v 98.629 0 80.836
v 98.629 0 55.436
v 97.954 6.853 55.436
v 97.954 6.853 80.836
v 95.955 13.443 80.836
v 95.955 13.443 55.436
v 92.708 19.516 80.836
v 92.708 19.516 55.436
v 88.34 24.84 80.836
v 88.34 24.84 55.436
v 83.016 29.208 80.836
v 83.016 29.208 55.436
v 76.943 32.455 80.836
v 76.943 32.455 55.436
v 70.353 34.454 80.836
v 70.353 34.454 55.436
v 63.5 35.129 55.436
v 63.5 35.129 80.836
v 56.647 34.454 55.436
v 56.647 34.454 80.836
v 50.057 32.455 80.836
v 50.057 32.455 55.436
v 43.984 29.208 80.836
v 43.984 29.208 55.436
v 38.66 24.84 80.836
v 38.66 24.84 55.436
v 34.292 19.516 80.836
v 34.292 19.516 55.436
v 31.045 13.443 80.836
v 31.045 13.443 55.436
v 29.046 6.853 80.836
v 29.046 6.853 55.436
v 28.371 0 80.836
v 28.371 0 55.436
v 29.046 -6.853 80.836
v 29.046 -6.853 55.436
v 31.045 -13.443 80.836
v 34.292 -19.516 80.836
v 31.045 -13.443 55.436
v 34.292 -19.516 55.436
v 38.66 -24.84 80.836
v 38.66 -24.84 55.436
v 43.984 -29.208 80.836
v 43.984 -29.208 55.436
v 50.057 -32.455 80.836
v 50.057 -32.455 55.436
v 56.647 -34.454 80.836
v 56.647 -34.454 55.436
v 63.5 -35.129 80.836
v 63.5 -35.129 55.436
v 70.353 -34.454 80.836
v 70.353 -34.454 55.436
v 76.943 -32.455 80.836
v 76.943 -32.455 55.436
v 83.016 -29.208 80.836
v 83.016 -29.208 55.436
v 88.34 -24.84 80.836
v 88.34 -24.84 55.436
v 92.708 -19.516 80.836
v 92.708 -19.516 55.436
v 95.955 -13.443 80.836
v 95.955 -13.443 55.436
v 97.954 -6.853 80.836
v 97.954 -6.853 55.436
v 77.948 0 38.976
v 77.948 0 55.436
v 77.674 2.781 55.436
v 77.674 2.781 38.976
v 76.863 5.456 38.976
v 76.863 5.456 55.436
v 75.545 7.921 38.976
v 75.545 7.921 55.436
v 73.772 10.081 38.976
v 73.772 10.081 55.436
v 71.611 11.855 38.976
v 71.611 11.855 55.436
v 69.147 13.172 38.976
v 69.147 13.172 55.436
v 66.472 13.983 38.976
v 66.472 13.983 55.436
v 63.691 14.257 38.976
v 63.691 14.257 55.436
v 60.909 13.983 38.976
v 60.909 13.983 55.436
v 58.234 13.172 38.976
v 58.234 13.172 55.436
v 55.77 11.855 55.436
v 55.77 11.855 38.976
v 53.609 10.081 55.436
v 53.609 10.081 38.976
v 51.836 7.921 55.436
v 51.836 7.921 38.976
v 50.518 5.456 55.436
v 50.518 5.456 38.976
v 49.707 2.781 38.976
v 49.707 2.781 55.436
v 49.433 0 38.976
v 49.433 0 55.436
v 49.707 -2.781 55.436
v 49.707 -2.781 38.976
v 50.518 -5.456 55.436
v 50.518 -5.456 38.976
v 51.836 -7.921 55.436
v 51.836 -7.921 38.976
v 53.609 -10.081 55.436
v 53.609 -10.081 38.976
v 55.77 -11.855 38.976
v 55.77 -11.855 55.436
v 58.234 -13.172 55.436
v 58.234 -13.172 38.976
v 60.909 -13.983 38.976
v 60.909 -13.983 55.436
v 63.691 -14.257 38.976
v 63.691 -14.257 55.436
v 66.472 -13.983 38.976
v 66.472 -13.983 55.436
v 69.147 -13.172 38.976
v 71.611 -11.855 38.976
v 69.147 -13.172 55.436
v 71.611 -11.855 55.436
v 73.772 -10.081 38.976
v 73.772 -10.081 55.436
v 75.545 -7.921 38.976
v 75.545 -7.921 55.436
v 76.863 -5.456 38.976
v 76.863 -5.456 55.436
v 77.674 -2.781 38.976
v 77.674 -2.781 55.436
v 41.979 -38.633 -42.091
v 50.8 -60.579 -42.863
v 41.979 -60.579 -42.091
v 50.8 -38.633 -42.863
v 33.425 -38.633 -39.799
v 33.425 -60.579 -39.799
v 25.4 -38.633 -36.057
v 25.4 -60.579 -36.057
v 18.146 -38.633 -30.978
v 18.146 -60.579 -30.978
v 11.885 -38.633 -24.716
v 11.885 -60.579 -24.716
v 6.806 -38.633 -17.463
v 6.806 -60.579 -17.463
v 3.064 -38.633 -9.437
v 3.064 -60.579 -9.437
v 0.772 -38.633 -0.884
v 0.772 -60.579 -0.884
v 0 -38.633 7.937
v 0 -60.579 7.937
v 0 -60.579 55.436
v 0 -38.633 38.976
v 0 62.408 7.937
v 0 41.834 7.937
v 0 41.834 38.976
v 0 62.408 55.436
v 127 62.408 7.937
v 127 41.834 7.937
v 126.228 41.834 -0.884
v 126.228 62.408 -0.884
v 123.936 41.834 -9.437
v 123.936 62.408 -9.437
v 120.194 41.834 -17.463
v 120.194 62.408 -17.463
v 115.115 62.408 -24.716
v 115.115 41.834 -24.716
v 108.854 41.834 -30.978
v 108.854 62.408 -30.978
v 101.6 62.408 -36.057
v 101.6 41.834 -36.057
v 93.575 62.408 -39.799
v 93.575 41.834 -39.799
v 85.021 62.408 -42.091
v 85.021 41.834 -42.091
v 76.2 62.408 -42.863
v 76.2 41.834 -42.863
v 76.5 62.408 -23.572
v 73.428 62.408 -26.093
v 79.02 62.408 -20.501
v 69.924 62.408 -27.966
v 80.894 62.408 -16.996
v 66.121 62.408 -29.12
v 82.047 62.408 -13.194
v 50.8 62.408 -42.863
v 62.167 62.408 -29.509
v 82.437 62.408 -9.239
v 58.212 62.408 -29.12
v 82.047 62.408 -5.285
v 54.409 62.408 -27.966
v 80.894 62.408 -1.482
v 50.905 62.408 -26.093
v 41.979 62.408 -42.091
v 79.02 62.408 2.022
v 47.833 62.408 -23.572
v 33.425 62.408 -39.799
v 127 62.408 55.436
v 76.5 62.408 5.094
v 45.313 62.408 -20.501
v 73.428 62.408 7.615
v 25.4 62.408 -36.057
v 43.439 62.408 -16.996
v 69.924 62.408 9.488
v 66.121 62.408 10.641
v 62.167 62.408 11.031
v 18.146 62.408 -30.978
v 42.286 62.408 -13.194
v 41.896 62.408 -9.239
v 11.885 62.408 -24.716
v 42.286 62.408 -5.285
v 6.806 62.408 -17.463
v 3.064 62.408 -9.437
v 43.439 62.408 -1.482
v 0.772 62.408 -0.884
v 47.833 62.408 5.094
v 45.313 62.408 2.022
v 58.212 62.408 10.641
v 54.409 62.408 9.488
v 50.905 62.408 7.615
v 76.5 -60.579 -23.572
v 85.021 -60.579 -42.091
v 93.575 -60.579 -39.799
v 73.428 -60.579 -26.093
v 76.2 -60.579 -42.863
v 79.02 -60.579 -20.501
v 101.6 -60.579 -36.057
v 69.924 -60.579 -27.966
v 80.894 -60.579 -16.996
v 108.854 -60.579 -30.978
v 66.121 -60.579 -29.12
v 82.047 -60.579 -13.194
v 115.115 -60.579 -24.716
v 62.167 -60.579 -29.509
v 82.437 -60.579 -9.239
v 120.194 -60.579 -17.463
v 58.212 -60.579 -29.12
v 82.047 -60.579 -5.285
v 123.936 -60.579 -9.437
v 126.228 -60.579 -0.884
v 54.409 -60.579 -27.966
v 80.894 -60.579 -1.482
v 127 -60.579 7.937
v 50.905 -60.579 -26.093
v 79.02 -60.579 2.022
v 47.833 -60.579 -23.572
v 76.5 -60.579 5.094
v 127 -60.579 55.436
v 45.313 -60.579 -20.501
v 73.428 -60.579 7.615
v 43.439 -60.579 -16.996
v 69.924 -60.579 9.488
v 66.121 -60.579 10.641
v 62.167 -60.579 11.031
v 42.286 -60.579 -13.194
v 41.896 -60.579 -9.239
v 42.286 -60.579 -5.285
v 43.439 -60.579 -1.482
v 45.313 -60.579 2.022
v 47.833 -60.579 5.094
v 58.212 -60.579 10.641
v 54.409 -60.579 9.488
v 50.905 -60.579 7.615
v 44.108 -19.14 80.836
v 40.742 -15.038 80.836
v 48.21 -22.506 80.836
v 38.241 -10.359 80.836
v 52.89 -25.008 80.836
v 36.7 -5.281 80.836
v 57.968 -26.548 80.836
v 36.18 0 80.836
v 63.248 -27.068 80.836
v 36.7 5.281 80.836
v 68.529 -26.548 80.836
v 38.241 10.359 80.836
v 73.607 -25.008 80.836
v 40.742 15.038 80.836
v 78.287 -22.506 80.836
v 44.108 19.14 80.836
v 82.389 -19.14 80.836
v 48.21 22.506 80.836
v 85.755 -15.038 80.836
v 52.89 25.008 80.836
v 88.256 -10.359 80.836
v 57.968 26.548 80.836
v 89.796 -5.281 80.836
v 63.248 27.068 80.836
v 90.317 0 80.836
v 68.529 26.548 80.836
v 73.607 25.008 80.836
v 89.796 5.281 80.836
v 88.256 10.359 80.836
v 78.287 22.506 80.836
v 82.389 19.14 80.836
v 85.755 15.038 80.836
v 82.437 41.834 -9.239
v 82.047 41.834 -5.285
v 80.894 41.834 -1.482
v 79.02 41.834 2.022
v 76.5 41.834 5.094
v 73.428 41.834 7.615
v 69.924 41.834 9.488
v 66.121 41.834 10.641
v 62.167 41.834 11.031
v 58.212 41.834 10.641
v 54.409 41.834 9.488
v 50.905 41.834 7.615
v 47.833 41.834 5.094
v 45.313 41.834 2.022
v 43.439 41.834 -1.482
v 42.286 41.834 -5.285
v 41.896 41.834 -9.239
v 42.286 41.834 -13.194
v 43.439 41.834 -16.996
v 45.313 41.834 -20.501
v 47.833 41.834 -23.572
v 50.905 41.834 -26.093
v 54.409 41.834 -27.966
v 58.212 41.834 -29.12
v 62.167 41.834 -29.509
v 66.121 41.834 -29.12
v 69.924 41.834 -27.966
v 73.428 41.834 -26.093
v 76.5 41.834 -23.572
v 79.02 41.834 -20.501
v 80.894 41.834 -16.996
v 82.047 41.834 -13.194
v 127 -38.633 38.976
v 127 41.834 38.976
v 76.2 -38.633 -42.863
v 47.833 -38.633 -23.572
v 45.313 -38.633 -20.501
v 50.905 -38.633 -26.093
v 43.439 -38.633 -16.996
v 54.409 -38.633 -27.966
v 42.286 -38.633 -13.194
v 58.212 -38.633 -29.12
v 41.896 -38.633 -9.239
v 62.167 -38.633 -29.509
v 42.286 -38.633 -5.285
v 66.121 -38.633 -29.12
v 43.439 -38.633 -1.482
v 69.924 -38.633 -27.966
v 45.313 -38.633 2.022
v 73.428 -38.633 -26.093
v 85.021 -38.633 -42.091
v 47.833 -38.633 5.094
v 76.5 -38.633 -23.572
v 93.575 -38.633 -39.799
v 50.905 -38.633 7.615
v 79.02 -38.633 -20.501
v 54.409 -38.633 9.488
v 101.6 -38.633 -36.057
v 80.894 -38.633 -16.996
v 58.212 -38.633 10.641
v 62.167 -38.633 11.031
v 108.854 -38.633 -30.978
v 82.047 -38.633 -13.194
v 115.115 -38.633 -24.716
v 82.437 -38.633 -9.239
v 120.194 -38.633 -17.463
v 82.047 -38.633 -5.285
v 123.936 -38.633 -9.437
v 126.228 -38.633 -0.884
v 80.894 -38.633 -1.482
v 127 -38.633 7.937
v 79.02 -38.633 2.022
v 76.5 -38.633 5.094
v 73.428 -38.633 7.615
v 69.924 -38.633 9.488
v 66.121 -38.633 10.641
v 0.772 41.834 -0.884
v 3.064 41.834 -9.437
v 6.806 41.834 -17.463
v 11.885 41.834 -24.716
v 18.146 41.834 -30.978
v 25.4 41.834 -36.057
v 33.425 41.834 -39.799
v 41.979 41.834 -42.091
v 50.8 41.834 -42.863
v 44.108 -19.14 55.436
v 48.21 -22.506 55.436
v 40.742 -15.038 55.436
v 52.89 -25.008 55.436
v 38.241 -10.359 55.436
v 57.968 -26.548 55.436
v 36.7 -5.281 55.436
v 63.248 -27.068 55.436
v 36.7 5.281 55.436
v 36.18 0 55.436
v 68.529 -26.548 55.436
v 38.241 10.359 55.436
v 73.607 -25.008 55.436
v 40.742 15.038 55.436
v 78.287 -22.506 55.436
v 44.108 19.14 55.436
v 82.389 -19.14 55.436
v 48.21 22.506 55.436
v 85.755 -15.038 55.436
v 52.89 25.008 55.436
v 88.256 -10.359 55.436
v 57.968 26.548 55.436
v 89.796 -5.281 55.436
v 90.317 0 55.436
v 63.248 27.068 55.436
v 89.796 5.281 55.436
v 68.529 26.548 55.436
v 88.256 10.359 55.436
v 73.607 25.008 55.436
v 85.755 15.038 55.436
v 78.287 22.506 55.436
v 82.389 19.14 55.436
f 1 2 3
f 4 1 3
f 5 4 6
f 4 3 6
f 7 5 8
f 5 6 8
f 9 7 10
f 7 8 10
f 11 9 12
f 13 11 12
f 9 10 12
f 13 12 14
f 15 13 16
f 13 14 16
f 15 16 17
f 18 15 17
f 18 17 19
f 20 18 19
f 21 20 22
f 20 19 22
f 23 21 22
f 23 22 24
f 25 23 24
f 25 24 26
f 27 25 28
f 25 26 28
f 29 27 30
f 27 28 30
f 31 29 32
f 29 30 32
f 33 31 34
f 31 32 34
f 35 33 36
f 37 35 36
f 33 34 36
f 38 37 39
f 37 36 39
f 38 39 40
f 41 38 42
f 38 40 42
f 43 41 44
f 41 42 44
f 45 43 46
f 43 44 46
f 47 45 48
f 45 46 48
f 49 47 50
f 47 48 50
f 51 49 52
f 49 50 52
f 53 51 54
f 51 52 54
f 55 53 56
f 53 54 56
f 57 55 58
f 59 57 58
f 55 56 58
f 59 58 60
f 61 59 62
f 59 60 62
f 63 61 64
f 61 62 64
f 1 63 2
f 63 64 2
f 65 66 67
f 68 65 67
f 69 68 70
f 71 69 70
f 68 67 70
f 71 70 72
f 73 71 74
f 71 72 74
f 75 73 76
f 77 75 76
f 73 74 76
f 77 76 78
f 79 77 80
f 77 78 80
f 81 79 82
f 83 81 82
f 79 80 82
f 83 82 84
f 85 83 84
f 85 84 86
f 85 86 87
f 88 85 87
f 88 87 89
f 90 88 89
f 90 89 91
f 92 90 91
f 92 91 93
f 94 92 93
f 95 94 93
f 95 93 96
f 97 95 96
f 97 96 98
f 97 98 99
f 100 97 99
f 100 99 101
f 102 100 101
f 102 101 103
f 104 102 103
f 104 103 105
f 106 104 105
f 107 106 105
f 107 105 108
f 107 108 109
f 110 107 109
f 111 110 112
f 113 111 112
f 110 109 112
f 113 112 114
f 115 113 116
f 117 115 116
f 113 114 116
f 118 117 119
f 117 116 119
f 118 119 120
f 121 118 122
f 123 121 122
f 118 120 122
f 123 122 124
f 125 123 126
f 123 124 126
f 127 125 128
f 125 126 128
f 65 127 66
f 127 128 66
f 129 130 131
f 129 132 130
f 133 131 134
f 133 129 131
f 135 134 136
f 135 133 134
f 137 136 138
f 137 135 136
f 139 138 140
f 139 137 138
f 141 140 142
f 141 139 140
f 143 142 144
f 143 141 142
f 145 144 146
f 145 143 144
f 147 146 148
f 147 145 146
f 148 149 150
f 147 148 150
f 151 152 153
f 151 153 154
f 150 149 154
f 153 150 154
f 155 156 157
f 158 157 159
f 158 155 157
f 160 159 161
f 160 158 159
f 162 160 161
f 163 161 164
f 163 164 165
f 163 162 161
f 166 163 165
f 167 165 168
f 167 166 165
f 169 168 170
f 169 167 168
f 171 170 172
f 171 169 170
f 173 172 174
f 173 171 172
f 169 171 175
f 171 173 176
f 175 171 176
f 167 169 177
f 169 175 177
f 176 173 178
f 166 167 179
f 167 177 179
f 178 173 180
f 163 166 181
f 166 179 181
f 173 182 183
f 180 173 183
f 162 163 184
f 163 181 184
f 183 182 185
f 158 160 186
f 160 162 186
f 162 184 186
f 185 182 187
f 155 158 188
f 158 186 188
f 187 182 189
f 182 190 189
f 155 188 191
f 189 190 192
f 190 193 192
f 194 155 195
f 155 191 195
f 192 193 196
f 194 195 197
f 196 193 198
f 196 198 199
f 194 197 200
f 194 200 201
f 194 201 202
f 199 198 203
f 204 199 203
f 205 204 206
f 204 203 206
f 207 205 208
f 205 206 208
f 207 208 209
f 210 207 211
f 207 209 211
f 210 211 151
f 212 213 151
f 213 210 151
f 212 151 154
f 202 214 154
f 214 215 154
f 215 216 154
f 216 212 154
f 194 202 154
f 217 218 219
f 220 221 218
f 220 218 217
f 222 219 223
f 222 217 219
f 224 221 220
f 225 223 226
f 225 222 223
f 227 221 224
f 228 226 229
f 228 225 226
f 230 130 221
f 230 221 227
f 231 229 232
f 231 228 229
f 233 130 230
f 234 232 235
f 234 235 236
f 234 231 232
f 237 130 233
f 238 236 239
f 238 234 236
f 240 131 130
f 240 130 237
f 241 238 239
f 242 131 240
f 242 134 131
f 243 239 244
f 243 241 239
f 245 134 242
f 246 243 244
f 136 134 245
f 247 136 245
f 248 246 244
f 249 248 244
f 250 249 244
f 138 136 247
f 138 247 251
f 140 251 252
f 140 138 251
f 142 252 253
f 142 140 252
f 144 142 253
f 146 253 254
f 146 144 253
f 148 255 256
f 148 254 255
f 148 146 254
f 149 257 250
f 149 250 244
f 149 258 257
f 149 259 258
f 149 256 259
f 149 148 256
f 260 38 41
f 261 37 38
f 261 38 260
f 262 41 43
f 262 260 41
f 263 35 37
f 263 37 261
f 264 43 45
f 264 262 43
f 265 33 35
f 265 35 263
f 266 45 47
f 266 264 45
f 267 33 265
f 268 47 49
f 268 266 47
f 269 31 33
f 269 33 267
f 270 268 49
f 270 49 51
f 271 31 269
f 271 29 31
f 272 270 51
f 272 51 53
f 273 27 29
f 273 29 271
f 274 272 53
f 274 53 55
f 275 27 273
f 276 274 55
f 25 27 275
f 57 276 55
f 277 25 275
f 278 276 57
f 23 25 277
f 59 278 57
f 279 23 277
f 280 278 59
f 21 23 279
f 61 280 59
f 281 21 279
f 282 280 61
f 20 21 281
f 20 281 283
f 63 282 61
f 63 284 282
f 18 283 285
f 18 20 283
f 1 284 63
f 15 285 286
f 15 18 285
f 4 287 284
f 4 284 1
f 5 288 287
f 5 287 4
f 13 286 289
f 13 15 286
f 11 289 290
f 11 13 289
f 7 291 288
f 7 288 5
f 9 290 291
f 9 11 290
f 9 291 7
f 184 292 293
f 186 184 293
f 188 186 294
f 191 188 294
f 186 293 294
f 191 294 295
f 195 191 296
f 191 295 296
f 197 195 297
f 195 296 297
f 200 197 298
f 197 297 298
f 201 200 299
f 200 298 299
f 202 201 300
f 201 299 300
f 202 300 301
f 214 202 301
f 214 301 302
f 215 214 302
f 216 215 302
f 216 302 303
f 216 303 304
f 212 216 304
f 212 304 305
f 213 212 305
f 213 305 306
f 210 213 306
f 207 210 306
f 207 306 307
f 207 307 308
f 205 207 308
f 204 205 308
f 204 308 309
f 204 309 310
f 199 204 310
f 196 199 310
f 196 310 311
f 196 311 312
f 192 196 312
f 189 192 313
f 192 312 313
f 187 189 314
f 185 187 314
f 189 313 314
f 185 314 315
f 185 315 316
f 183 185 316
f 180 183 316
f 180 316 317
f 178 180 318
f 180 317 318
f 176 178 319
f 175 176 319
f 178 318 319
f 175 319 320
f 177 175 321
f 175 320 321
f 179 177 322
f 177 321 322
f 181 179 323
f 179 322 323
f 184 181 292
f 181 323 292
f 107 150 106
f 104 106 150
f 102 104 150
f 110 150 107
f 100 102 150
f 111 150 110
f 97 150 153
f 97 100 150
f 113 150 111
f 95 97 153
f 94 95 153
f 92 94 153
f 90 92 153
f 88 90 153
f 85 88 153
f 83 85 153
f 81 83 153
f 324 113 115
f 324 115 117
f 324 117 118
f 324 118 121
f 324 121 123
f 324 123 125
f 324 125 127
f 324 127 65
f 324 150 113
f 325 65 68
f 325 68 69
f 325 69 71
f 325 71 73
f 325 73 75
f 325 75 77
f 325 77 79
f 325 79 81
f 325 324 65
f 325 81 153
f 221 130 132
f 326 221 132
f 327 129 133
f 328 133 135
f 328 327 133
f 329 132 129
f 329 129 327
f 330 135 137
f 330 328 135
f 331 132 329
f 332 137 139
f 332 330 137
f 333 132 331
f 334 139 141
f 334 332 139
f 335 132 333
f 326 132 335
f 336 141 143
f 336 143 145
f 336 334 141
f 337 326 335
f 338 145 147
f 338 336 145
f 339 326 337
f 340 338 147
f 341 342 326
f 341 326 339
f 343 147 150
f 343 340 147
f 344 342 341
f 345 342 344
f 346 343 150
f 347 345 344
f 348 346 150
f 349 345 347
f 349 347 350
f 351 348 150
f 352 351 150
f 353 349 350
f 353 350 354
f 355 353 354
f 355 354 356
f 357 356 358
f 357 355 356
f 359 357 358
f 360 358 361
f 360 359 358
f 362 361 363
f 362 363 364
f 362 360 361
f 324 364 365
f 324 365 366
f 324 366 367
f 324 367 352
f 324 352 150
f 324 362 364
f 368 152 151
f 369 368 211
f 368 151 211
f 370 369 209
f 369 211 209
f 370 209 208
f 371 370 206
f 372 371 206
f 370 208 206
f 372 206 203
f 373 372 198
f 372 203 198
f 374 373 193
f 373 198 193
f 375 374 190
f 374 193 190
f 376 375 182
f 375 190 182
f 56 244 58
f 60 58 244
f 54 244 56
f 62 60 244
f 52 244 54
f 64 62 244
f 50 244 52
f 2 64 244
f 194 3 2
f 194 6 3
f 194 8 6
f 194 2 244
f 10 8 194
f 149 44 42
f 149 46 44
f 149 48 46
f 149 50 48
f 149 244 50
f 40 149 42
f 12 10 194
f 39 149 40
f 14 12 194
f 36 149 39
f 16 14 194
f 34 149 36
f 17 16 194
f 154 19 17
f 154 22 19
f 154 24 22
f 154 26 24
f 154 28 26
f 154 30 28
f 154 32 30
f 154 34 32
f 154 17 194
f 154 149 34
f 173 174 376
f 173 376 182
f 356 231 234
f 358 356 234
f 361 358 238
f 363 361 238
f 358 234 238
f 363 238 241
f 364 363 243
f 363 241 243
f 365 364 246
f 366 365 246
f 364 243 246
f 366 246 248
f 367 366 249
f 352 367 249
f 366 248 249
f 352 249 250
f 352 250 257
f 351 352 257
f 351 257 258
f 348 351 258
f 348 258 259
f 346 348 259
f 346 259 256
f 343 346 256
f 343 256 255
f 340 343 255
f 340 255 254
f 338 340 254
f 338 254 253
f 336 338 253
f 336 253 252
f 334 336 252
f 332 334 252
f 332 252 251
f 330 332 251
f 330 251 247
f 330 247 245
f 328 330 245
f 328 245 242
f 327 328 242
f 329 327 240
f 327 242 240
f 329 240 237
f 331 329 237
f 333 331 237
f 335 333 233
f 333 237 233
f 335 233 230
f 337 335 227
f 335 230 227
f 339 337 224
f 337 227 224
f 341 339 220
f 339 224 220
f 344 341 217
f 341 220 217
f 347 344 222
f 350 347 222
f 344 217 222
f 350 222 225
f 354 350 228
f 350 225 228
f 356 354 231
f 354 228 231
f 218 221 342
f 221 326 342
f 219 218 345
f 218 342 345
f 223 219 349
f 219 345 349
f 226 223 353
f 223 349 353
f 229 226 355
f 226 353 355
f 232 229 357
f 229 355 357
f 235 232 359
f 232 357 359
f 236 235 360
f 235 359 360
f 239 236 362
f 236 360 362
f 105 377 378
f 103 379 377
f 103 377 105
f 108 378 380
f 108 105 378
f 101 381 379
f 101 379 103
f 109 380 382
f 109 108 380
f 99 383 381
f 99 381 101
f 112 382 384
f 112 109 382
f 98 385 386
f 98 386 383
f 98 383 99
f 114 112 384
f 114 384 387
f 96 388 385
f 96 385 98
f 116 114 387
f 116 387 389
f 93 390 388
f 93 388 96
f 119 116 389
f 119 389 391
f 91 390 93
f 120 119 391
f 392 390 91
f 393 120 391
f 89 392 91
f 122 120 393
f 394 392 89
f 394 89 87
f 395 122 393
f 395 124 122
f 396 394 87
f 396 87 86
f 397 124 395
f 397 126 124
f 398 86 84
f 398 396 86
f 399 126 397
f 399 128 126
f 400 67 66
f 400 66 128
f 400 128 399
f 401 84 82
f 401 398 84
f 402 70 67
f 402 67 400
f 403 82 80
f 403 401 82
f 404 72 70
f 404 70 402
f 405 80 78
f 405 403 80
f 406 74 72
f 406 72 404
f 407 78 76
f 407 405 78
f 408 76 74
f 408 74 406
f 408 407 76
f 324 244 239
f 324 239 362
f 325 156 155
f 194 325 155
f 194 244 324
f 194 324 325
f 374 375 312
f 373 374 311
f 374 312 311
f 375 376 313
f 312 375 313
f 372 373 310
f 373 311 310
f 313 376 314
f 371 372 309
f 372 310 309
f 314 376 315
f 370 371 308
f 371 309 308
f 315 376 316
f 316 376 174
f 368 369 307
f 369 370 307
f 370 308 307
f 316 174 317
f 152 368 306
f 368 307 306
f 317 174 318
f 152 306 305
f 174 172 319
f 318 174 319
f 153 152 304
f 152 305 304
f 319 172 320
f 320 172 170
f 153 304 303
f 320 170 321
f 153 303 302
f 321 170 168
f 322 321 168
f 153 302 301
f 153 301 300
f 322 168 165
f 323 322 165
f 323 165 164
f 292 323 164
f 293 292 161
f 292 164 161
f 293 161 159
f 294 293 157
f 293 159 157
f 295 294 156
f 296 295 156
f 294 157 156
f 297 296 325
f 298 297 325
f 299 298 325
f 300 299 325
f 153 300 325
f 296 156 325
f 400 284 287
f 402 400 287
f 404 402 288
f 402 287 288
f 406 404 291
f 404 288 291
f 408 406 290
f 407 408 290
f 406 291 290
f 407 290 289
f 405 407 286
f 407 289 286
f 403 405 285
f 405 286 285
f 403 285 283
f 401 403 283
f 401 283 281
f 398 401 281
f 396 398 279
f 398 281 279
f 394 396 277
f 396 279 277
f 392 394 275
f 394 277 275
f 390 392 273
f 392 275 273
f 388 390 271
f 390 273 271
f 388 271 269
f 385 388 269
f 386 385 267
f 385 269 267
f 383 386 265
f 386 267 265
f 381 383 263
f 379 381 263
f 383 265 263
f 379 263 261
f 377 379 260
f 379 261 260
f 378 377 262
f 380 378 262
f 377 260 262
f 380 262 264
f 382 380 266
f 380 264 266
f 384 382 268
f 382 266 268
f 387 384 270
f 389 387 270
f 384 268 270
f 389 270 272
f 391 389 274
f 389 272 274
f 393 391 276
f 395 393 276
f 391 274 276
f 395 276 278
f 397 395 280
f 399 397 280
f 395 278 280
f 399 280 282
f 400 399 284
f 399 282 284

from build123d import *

# Parameters (mm, degrees)
F0_W      = 122.9868046939
F0_H      = 98.2980020344
F1_DEPTH  = 127
F2_W      = 80.4672054946
F2_H      = 81.8388015032
F3_DEPTH  = 127
F4_R      = 50.8
F5_R      = 20.2701316202
F6_DEPTH  = 254
F7_R      = 35.128731484
F8_DEPTH  = 25.4
F10_R     = 27.0682263701
F11_DEPTH = 25.4
F12_R     = 14.2572995328
F13_DEPTH = 50.8


with BuildPart() as f1:
    # F0 (on Right) → F1 (new body)
    with BuildSketch(Plane.YZ):
        with Locations((0.9144004434, 6.2865000218)):
            Rectangle(F0_W, F0_H)
    extrude(amount=F1_DEPTH)

    # F2 (on face) → F3 (cut)
    with BuildSketch(Plane.YZ.offset(127)):
        with Locations((1.6002003103, -1.9431002438)):
            Rectangle(F2_W, F2_H)
    extrude(amount=-F3_DEPTH, mode=Mode.SUBTRACT)

    # F4
    f4_edges = [f1.edges().sort_by_distance(p)[0] for p in [
        (127, -49.606202, -42.862501),
        (0, -49.606202, -42.862501),
        (0, 52.120803, -42.862501),
        (127, 52.120803, -42.862501),
    ]]
    fillet(f4_edges, radius=F4_R)

    # F5 (on face) → F6 (cut)
    with BuildSketch(Plane.XZ.offset(60.5790019035)):
        with Locations((62.1665008366, -9.2392507941)):
            Circle(F5_R)
    extrude(amount=-F6_DEPTH, mode=Mode.SUBTRACT)

    # F7 (on face) → F8 (join)
    with BuildSketch(Plane.XY.offset(55.435501039)):
        with Locations((63.5, 0)):
            Circle(F7_R)
    extrude(amount=F8_DEPTH)

    # F10 (on face) → F11 (cut)
    with BuildSketch(Plane.XY.offset(80.835501039)):
        with Locations((63.2483810186, 0)):
            Circle(F10_R)
    extrude(amount=-F11_DEPTH, mode=Mode.SUBTRACT)

    # F12 (on face) → F13 (cut)
    with BuildSketch(Plane.XY.offset(80.835501039)):
        with Locations((63.6905059218, 0)):
            Circle(F12_R)
    extrude(amount=-F13_DEPTH, mode=Mode.SUBTRACT)


solid = f1.part
